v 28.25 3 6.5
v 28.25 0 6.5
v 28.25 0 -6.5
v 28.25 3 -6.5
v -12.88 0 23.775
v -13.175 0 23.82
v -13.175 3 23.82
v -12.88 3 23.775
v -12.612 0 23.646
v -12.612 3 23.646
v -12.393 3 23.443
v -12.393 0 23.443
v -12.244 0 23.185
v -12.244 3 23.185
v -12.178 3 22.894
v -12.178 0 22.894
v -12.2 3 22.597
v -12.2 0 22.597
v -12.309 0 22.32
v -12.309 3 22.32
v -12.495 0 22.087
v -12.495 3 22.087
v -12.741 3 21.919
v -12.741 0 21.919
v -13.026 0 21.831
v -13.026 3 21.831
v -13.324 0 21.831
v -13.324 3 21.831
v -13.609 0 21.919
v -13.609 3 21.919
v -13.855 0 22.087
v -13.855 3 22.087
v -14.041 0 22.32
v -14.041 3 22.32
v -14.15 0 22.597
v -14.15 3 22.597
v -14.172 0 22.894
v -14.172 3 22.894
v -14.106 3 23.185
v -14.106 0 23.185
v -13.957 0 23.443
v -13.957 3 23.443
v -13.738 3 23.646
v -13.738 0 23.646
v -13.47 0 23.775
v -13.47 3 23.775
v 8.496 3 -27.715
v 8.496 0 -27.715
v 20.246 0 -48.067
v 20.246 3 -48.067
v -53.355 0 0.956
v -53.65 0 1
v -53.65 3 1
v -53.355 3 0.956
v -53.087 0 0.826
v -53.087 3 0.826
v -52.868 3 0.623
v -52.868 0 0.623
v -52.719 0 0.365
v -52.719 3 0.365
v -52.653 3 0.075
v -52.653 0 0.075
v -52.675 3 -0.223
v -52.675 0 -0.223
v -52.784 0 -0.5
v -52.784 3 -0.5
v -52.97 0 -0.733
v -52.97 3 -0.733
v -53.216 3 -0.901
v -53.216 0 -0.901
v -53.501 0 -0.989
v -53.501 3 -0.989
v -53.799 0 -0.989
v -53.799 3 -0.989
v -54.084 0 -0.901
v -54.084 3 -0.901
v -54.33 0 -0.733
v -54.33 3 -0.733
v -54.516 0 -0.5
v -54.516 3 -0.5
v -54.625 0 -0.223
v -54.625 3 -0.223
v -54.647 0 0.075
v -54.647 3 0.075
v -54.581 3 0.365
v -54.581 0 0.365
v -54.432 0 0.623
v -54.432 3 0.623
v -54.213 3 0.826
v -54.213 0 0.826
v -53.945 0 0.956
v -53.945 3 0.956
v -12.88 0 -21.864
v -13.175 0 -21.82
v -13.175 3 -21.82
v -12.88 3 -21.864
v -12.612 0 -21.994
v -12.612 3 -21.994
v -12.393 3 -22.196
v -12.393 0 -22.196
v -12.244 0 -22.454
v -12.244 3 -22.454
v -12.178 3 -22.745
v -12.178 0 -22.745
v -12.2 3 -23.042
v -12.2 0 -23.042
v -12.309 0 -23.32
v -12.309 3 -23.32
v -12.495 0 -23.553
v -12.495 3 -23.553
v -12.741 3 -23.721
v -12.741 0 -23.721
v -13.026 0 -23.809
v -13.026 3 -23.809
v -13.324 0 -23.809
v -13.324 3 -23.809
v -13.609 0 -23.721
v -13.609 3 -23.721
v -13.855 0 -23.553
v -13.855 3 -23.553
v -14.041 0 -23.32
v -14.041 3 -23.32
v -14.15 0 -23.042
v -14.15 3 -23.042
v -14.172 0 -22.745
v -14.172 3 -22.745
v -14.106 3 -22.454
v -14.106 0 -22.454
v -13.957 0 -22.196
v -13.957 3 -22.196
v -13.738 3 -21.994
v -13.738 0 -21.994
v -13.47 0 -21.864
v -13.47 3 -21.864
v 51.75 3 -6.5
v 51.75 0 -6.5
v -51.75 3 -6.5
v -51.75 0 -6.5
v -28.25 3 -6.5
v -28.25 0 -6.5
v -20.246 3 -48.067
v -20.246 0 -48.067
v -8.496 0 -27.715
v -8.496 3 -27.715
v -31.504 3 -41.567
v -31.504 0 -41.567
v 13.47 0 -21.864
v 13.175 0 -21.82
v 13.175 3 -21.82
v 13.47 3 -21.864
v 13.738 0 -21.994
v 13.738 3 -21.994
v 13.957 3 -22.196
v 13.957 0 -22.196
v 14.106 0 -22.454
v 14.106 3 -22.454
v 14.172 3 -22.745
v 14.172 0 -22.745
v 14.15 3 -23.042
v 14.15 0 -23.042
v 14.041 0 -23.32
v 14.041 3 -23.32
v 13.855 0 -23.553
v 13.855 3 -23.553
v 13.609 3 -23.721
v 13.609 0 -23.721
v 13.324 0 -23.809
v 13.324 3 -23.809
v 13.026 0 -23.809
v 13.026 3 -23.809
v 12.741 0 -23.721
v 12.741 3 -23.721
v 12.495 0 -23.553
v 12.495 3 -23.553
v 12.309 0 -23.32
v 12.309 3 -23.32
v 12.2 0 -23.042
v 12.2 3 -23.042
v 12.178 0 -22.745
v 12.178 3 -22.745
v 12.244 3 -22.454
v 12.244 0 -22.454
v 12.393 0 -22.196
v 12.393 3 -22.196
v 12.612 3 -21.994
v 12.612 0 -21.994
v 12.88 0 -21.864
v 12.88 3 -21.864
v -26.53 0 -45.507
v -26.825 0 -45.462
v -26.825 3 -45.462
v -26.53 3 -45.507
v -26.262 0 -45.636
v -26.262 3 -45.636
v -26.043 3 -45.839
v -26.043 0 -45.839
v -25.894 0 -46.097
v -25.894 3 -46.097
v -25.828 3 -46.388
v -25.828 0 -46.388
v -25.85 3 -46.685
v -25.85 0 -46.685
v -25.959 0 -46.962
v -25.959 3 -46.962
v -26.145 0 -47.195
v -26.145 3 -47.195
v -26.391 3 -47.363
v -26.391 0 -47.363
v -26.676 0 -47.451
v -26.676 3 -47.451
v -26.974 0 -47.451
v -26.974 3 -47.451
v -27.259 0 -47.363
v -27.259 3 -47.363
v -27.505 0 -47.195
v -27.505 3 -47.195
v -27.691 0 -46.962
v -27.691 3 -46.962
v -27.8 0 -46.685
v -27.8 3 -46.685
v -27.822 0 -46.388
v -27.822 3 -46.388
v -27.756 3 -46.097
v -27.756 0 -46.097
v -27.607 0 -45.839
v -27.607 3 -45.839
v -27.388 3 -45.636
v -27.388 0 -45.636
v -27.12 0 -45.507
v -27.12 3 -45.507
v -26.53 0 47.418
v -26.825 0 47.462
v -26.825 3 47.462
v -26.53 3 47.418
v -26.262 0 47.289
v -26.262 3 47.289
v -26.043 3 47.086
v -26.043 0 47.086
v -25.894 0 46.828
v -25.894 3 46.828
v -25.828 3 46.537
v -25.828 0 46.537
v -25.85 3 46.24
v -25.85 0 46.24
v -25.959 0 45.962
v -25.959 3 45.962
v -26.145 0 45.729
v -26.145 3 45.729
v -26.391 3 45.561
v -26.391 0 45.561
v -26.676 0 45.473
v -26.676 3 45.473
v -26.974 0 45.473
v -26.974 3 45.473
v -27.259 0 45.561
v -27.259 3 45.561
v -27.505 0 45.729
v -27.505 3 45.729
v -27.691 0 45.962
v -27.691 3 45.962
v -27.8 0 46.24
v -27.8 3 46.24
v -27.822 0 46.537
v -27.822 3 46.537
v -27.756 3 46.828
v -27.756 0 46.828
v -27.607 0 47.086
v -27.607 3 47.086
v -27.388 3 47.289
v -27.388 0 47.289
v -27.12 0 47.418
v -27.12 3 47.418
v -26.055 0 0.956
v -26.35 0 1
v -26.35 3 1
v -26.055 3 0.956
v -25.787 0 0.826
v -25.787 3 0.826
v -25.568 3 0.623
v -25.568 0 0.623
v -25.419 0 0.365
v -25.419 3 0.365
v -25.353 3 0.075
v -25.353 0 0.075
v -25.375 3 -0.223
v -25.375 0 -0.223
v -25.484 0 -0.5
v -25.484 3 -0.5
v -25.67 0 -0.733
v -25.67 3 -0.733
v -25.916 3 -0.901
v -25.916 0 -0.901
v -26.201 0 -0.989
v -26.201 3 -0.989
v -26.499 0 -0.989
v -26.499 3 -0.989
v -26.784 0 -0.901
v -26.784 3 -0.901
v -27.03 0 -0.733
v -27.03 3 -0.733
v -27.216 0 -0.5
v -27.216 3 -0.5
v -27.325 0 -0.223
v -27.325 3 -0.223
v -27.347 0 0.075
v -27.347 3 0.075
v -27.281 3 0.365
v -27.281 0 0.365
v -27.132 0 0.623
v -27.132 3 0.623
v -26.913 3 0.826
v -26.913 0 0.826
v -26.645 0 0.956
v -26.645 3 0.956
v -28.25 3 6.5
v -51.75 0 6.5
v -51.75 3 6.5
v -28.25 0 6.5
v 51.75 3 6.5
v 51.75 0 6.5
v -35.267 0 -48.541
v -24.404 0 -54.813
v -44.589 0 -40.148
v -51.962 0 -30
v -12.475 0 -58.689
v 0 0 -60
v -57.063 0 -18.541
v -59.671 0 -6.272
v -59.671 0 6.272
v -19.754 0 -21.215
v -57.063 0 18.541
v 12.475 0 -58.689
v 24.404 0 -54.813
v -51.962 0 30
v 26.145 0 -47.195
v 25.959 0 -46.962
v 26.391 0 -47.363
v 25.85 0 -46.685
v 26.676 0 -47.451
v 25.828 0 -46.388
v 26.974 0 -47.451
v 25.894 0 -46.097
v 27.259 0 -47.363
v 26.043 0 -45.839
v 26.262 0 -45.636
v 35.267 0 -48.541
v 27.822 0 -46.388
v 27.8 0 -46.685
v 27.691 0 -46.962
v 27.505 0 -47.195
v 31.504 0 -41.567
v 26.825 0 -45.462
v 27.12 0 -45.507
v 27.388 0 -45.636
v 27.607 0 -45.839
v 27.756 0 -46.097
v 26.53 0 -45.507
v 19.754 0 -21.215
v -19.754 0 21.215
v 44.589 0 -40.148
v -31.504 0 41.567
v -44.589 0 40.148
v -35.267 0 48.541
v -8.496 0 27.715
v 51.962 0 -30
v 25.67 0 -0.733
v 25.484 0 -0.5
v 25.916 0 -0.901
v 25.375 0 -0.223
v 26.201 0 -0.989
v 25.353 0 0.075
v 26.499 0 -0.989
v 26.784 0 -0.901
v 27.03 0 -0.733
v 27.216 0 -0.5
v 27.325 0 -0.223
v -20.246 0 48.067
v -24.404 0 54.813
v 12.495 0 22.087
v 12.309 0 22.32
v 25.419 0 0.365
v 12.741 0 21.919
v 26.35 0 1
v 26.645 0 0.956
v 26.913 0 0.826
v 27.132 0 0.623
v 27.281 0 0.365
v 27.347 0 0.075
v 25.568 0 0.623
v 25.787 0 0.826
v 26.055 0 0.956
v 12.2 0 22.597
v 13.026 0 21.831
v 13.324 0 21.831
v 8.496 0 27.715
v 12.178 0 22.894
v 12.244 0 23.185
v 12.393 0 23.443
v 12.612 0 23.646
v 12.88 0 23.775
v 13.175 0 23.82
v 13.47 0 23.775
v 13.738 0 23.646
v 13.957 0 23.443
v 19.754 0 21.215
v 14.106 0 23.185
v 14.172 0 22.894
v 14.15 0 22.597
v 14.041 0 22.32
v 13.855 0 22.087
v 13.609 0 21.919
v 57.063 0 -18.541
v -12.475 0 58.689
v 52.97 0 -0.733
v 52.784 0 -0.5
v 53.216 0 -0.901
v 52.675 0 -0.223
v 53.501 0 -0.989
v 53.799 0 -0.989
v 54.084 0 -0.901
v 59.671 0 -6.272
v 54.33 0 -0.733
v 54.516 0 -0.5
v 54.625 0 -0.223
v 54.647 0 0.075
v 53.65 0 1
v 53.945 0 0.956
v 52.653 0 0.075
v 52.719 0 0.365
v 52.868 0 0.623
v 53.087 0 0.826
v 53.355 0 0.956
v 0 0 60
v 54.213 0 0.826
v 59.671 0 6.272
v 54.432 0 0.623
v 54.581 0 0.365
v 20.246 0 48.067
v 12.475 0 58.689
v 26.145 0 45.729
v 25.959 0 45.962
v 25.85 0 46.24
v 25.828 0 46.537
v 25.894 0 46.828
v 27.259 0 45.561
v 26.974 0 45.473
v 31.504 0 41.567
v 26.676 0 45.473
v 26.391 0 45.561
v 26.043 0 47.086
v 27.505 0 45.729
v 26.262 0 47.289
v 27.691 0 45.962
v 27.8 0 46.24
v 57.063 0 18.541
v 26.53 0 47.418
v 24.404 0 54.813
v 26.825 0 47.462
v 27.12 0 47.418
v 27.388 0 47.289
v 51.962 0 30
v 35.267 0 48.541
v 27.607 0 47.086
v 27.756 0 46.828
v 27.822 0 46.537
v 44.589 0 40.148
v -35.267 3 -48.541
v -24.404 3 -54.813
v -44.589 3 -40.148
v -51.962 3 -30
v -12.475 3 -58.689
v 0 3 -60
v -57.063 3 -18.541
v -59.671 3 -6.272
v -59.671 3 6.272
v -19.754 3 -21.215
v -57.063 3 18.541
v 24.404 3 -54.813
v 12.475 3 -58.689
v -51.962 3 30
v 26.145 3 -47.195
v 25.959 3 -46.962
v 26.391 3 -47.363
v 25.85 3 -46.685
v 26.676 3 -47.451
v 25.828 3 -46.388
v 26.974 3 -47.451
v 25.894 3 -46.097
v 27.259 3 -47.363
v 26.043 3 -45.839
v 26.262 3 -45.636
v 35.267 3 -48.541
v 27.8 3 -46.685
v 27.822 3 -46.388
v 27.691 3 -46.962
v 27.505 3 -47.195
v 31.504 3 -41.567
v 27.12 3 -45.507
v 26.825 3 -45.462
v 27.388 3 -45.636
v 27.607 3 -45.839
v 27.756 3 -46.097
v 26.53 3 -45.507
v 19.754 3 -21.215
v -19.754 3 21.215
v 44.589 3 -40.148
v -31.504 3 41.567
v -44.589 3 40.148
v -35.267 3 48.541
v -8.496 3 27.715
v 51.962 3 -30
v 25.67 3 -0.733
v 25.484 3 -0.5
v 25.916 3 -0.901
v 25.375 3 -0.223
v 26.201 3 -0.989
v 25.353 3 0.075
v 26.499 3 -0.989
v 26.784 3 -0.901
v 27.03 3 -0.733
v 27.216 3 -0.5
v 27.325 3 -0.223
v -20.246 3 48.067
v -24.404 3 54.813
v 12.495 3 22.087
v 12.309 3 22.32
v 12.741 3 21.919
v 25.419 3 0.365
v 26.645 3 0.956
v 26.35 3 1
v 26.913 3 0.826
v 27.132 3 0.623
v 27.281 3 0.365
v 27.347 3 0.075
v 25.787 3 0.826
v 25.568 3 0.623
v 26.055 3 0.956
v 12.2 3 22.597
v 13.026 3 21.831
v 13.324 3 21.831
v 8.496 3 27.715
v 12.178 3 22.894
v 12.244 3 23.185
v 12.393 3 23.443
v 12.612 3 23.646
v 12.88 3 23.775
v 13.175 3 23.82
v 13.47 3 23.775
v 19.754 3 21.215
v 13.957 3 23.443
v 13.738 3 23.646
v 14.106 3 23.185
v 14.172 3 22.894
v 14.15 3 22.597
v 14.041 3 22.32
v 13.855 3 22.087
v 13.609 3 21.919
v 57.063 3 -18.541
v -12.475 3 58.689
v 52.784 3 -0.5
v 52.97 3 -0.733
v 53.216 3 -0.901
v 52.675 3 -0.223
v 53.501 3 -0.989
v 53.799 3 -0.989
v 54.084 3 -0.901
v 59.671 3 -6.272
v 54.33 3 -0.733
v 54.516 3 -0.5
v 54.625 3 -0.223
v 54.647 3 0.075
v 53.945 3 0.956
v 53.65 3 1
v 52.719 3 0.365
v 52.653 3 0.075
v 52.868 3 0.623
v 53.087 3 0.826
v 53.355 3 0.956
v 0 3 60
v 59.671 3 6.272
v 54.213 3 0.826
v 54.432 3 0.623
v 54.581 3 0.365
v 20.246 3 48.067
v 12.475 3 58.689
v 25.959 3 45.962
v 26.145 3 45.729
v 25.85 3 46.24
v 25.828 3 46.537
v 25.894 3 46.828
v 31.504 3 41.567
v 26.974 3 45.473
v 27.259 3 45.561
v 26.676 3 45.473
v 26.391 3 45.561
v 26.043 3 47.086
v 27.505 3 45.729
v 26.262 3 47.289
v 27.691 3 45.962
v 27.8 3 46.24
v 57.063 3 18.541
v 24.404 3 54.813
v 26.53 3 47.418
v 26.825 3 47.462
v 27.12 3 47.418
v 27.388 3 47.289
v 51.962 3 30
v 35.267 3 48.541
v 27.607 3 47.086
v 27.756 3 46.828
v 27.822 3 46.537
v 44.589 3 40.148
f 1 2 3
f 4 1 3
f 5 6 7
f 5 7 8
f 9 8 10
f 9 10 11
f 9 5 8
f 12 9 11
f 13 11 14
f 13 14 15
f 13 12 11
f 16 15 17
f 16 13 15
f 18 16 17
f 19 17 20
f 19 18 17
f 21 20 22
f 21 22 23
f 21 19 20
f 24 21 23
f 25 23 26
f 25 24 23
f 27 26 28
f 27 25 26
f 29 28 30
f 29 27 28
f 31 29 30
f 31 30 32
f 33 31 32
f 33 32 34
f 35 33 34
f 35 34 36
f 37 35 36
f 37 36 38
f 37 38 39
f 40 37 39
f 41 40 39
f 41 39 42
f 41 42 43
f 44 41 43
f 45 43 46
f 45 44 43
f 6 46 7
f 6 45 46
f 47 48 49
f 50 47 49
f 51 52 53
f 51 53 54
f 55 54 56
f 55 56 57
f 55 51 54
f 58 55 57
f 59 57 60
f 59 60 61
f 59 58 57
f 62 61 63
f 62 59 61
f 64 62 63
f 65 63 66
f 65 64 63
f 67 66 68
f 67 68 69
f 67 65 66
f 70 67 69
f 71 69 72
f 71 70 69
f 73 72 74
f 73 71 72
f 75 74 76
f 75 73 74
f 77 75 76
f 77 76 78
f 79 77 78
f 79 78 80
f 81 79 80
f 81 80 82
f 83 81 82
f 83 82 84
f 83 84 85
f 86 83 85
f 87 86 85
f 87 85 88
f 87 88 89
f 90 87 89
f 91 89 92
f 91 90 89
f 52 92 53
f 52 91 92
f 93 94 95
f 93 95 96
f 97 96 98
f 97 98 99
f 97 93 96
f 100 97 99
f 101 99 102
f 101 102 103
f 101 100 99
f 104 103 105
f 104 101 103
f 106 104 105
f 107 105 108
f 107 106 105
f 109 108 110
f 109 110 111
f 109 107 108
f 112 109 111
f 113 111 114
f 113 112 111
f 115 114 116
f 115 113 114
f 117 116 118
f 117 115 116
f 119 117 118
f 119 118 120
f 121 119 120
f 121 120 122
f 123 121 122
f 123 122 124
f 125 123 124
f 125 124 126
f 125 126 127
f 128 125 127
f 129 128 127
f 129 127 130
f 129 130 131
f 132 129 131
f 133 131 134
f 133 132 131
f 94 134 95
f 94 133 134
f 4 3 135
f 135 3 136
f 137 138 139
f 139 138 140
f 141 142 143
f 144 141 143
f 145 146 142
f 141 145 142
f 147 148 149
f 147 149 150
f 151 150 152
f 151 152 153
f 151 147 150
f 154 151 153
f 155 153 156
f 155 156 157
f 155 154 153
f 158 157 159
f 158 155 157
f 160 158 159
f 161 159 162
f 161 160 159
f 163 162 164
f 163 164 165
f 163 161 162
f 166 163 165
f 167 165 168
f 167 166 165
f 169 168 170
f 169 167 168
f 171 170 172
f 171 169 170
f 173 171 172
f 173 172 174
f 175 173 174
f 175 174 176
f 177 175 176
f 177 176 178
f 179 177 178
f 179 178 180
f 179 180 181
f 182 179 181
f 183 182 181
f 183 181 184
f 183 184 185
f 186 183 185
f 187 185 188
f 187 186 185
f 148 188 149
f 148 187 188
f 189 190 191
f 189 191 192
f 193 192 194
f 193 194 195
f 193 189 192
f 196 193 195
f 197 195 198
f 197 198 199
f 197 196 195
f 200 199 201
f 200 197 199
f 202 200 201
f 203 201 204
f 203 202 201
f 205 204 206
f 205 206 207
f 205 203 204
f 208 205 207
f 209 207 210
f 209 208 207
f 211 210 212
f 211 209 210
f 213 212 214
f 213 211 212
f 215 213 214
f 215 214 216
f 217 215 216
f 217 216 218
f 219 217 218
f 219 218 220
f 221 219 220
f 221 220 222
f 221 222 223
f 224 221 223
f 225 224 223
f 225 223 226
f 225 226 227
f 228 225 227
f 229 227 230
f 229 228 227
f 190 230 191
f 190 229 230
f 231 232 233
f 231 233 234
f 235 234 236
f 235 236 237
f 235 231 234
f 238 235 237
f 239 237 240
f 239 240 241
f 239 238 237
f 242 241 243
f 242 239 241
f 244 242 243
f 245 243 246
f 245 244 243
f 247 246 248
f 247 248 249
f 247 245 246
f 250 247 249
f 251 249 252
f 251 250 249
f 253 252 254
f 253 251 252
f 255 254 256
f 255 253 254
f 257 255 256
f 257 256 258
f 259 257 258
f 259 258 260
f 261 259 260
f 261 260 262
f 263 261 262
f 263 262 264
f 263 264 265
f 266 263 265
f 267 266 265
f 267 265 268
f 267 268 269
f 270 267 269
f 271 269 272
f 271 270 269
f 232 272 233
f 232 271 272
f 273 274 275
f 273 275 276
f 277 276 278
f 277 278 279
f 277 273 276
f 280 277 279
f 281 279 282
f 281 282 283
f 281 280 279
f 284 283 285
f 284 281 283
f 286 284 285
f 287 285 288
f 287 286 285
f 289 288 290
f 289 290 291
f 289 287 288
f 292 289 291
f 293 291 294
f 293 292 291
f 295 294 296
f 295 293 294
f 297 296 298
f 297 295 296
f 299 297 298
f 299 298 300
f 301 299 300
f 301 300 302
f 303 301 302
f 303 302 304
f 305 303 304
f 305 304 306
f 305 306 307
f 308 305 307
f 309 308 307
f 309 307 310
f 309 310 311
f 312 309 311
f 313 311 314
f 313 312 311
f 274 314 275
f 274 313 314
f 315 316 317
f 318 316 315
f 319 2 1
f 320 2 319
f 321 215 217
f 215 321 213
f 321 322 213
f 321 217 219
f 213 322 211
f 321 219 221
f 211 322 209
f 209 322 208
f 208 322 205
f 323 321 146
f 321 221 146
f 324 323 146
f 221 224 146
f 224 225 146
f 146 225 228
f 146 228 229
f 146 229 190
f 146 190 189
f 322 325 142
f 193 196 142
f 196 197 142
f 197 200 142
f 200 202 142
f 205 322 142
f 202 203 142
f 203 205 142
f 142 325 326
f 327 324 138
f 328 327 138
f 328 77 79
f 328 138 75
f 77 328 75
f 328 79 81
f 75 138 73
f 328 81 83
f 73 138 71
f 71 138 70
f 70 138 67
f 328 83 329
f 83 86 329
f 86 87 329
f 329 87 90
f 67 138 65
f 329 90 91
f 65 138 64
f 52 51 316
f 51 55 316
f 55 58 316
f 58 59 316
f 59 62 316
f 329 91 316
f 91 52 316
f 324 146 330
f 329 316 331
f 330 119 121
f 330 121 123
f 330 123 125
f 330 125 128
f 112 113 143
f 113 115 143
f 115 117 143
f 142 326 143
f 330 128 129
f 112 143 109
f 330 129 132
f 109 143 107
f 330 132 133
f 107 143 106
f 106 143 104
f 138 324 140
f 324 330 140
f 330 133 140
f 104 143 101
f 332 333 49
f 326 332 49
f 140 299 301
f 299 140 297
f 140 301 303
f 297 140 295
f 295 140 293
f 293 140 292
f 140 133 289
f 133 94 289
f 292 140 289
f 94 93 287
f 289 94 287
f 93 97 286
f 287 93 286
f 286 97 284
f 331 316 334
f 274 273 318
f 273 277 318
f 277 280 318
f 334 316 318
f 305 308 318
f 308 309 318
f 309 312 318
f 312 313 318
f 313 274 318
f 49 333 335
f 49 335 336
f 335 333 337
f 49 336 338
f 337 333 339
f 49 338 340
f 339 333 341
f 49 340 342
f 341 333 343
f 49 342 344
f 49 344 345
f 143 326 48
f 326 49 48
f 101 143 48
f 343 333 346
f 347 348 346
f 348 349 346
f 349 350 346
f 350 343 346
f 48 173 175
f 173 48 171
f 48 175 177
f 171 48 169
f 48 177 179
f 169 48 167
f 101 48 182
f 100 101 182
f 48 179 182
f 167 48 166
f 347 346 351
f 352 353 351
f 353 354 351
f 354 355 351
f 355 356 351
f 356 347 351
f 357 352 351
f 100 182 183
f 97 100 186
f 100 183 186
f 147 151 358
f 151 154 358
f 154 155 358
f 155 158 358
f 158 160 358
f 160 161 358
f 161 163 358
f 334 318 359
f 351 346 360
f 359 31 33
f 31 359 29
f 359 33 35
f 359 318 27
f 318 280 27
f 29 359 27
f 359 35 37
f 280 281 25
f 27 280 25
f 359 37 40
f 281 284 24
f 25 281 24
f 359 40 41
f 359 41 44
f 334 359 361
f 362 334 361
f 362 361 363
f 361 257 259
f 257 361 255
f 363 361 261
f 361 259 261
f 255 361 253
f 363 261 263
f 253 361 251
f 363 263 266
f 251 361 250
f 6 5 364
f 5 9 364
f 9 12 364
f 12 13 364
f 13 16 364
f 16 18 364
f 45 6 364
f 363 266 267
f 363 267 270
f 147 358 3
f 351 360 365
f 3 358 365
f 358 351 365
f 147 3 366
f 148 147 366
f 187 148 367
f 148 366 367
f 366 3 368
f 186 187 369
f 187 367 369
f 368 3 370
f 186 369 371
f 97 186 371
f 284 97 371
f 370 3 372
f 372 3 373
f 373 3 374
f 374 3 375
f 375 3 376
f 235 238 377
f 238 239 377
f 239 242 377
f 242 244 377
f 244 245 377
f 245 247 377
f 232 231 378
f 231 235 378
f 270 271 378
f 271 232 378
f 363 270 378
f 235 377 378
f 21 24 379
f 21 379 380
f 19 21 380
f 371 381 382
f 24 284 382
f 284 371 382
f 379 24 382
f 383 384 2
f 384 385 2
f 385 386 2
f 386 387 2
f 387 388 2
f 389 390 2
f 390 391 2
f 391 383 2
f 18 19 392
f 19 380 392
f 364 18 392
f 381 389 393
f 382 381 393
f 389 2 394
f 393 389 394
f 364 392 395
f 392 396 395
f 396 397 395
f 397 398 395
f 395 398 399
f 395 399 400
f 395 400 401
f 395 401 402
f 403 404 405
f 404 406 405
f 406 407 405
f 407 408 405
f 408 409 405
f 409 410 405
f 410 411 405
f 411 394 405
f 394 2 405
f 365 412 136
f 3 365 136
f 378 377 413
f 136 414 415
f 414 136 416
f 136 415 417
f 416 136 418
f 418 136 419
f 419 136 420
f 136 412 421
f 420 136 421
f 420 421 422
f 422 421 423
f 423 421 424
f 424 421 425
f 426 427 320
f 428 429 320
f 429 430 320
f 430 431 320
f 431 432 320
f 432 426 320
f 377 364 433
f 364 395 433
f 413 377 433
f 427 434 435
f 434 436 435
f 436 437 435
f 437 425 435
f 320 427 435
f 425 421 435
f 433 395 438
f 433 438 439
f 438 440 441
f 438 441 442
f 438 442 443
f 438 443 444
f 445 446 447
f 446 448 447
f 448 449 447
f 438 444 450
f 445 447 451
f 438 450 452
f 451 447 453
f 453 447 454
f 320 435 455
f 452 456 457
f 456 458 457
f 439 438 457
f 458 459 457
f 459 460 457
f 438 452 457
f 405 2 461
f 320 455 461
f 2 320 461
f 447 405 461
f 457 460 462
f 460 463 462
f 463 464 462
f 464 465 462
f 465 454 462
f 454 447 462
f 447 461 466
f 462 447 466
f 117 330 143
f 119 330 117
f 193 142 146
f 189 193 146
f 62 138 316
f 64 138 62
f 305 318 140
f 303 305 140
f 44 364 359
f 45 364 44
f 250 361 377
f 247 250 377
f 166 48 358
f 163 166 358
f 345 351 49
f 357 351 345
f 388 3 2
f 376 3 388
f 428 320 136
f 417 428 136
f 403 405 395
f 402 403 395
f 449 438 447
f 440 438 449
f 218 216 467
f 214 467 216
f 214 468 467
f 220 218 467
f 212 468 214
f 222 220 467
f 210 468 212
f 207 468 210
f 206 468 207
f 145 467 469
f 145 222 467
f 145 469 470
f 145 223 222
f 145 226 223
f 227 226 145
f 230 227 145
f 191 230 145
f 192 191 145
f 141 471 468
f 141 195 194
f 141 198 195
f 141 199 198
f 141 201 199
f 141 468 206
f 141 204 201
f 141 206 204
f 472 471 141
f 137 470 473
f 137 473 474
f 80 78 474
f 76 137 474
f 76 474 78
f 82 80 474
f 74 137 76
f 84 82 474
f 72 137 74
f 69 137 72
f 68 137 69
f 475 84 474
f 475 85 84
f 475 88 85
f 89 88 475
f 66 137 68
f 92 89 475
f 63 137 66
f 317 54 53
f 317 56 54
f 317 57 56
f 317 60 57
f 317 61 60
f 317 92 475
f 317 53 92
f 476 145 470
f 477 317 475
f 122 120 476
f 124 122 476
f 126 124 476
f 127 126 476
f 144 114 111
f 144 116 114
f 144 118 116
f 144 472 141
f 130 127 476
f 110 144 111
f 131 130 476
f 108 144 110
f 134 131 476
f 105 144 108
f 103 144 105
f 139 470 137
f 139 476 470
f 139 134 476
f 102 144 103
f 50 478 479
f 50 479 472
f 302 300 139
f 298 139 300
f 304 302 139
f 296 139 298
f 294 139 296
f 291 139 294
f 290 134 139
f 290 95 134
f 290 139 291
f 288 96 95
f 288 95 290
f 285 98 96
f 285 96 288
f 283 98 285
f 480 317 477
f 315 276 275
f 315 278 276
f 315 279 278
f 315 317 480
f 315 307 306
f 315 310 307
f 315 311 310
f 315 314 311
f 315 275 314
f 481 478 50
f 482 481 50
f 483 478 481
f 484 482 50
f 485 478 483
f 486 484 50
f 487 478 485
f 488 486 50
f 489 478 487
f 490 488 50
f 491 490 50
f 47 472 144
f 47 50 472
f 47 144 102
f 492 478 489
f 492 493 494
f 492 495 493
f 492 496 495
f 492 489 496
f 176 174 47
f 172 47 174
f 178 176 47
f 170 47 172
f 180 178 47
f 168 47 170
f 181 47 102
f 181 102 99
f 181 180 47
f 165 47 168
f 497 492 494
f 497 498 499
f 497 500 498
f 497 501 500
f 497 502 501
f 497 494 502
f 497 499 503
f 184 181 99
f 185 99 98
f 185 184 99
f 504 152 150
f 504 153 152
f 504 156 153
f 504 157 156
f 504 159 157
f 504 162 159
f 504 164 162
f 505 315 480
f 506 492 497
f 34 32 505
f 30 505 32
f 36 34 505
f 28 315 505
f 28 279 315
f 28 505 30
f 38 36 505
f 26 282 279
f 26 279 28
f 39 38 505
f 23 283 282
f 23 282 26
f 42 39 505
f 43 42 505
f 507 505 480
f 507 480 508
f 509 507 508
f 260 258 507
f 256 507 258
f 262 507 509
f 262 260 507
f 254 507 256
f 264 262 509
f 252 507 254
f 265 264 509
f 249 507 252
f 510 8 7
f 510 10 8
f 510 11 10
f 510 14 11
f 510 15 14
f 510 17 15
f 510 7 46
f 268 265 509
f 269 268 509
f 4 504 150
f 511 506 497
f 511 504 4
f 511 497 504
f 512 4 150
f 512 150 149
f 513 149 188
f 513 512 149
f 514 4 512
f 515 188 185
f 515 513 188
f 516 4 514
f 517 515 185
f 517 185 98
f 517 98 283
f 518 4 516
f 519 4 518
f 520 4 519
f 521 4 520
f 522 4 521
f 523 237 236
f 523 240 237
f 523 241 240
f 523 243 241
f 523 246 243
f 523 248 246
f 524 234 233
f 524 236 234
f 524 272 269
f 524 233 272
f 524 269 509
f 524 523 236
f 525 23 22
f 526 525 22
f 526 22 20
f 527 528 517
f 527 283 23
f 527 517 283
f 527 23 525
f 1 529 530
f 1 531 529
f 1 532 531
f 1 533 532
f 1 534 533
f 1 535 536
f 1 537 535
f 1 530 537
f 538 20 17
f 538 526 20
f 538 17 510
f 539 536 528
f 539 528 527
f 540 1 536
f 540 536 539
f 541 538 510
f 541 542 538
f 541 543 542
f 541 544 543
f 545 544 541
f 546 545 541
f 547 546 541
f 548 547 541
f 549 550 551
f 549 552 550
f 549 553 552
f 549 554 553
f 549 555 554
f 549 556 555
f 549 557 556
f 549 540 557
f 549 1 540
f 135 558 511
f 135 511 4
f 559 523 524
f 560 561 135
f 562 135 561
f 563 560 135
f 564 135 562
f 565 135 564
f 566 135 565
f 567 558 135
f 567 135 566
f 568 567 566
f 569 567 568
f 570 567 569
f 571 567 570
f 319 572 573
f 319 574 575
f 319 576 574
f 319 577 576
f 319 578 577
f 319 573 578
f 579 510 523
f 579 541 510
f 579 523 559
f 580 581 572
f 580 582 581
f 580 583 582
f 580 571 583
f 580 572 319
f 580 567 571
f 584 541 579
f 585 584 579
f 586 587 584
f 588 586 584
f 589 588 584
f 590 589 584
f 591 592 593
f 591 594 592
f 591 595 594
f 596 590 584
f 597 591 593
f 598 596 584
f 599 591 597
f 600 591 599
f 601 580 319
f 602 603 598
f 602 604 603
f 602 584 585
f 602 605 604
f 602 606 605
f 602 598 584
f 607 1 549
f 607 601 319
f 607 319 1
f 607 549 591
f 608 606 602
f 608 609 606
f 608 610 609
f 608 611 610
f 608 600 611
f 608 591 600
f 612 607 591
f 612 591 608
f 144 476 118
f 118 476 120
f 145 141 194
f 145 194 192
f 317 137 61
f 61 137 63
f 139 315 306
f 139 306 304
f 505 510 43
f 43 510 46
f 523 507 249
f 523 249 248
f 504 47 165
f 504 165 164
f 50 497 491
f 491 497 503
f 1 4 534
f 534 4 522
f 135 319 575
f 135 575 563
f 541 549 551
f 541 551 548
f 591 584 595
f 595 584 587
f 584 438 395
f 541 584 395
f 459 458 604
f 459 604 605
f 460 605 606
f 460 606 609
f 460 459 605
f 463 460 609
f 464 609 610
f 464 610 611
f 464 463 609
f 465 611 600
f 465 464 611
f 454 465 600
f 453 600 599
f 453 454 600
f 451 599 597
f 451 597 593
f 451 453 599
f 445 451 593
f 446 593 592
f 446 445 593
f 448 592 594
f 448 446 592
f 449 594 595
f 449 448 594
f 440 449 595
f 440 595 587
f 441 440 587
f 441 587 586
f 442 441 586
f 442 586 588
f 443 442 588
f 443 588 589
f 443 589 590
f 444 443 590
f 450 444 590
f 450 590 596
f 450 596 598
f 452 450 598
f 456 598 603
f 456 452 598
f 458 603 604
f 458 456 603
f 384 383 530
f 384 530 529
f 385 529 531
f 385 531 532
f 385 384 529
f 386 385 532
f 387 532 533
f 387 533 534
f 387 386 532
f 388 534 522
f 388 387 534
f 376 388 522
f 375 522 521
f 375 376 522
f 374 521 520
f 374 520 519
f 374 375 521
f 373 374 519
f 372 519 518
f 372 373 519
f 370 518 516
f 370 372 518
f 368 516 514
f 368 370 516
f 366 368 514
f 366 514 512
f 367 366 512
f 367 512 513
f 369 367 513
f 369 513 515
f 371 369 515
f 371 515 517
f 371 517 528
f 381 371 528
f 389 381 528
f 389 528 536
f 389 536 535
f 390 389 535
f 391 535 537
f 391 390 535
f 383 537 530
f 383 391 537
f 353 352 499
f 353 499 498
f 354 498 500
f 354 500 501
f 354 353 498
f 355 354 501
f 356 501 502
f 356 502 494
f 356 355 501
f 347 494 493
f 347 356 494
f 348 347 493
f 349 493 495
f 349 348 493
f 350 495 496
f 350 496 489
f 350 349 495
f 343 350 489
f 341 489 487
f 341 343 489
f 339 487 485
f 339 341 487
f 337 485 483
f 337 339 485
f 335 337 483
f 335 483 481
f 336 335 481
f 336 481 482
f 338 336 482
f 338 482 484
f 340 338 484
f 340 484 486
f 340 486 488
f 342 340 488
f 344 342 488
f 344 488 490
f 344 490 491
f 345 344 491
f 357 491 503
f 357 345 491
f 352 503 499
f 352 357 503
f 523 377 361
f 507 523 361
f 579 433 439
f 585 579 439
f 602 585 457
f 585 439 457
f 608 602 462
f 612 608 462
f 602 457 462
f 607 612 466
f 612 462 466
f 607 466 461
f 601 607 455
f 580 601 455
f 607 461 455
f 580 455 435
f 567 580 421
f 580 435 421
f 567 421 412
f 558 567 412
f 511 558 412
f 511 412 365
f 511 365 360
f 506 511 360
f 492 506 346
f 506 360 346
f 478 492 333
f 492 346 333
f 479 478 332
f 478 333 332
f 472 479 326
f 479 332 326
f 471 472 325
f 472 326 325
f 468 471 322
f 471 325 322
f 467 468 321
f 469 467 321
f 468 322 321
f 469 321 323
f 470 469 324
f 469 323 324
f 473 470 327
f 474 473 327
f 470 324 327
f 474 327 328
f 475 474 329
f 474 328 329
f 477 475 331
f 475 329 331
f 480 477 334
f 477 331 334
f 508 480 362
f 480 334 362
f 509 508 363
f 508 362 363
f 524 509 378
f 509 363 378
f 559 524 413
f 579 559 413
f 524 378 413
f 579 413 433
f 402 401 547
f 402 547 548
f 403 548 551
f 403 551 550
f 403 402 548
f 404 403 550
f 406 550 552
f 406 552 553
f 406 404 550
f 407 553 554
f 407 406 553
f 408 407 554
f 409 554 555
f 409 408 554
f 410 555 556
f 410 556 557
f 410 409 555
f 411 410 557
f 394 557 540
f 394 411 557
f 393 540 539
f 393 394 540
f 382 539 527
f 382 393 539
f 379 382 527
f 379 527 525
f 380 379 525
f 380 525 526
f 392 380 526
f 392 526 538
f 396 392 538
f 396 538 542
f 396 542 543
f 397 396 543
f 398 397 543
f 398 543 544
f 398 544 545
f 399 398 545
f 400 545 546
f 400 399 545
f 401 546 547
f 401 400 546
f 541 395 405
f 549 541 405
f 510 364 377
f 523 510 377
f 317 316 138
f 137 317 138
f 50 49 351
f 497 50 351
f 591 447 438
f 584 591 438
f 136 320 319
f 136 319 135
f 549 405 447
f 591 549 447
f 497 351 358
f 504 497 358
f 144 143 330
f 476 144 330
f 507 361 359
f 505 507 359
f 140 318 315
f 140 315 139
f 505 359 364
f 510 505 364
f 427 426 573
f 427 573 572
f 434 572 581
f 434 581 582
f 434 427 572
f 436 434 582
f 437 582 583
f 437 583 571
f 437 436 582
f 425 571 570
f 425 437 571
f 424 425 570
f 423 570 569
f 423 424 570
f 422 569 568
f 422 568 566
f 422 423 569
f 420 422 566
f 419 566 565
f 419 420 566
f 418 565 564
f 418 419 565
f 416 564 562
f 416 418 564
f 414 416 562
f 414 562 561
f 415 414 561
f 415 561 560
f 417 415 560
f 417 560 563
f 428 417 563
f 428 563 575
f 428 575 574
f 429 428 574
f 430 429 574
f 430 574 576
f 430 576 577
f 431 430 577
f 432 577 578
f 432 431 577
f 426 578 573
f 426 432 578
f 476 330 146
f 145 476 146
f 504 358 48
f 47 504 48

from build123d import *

# Parameters (mm, degrees)
SKETCH1_R           = 60
SKETCH1_R_2         = 1
SKETCH1_W           = 23.5
SKETCH1_H           = 13
BOSS_EXTRUDE1_DEPTH = 3


with BuildPart() as part:
    # Sketch1 → Boss-Extrude1 (new body)
    with BuildSketch(Plane(origin=(0, 0, 0), x_dir=(1, 0, 0), z_dir=(0, 1, 0))):
        with Locations(Location((0, 0, 0), (0, 0, 270))):
            Circle(SKETCH1_R)
        with Locations(Location((26.35, 0, 0), (0, 0, 270))):
            Circle(SKETCH1_R_2, mode=Mode.SUBTRACT)
        with Locations(Location((53.65, 0, 0), (0, 0, 270))):
            Circle(SKETCH1_R_2, mode=Mode.SUBTRACT)
        with Locations(Location((13.175, -22.81976939, 0), (0, 0, 270))):
            Circle(SKETCH1_R_2, mode=Mode.SUBTRACT)
        with Locations(Location((26.825, -46.462262913, 0), (0, 0, 270))):
            Circle(SKETCH1_R_2, mode=Mode.SUBTRACT)
        with Locations(Location((-13.175, -22.81976939, 0), (0, 0, 270))):
            Circle(SKETCH1_R_2, mode=Mode.SUBTRACT)
        with Locations(Location((-26.825, -46.462262913, 0), (0, 0, 270))):
            Circle(SKETCH1_R_2, mode=Mode.SUBTRACT)
        with Locations(Location((-26.35, 0, 0), (0, 0, 270))):
            Circle(SKETCH1_R_2, mode=Mode.SUBTRACT)
        with Locations(Location((-53.65, 0, 0), (0, 0, 270))):
            Circle(SKETCH1_R_2, mode=Mode.SUBTRACT)
        with Locations(Location((-13.175, 22.81976939, 0), (0, 0, 270))):
            Circle(SKETCH1_R_2, mode=Mode.SUBTRACT)
        with Locations(Location((-26.825, 46.462262913, 0), (0, 0, 270))):
            Circle(SKETCH1_R_2, mode=Mode.SUBTRACT)
        with Locations(Location((13.175, 22.81976939, 0), (0, 0, 270))):
            Circle(SKETCH1_R_2, mode=Mode.SUBTRACT)
        with Locations(Location((26.825, 46.462262913, 0), (0, 0, 270))):
            Circle(SKETCH1_R_2, mode=Mode.SUBTRACT)
        with Locations((40, 0)):
            Rectangle(SKETCH1_W, SKETCH1_H, mode=Mode.SUBTRACT)
        Polygon((8.495834875, -27.715217657), (19.754165125, -21.215217657), (31.504165125, -41.566814646), (20.245834875, -48.066814646), align=None, mode=Mode.SUBTRACT)
        Polygon((-19.754165125, -21.215217657), (-8.495834875, -27.715217657), (-20.245834875, -48.066814646), (-31.504165125, -41.566814646), align=None, mode=Mode.SUBTRACT)
        with Locations((-40, 0)):
            Rectangle(SKETCH1_W, SKETCH1_H, mode=Mode.SUBTRACT)
        Polygon((-8.495834875, 27.715217657), (-19.754165125, 21.215217657), (-31.504165125, 41.566814646), (-20.245834875, 48.066814646), align=None, mode=Mode.SUBTRACT)
        Polygon((19.754165125, 21.215217657), (8.495834875, 27.715217657), (20.245834875, 48.066814646), (31.504165125, 41.566814646), align=None, mode=Mode.SUBTRACT)
    extrude(amount=BOSS_EXTRUDE1_DEPTH)


solid = part.part
